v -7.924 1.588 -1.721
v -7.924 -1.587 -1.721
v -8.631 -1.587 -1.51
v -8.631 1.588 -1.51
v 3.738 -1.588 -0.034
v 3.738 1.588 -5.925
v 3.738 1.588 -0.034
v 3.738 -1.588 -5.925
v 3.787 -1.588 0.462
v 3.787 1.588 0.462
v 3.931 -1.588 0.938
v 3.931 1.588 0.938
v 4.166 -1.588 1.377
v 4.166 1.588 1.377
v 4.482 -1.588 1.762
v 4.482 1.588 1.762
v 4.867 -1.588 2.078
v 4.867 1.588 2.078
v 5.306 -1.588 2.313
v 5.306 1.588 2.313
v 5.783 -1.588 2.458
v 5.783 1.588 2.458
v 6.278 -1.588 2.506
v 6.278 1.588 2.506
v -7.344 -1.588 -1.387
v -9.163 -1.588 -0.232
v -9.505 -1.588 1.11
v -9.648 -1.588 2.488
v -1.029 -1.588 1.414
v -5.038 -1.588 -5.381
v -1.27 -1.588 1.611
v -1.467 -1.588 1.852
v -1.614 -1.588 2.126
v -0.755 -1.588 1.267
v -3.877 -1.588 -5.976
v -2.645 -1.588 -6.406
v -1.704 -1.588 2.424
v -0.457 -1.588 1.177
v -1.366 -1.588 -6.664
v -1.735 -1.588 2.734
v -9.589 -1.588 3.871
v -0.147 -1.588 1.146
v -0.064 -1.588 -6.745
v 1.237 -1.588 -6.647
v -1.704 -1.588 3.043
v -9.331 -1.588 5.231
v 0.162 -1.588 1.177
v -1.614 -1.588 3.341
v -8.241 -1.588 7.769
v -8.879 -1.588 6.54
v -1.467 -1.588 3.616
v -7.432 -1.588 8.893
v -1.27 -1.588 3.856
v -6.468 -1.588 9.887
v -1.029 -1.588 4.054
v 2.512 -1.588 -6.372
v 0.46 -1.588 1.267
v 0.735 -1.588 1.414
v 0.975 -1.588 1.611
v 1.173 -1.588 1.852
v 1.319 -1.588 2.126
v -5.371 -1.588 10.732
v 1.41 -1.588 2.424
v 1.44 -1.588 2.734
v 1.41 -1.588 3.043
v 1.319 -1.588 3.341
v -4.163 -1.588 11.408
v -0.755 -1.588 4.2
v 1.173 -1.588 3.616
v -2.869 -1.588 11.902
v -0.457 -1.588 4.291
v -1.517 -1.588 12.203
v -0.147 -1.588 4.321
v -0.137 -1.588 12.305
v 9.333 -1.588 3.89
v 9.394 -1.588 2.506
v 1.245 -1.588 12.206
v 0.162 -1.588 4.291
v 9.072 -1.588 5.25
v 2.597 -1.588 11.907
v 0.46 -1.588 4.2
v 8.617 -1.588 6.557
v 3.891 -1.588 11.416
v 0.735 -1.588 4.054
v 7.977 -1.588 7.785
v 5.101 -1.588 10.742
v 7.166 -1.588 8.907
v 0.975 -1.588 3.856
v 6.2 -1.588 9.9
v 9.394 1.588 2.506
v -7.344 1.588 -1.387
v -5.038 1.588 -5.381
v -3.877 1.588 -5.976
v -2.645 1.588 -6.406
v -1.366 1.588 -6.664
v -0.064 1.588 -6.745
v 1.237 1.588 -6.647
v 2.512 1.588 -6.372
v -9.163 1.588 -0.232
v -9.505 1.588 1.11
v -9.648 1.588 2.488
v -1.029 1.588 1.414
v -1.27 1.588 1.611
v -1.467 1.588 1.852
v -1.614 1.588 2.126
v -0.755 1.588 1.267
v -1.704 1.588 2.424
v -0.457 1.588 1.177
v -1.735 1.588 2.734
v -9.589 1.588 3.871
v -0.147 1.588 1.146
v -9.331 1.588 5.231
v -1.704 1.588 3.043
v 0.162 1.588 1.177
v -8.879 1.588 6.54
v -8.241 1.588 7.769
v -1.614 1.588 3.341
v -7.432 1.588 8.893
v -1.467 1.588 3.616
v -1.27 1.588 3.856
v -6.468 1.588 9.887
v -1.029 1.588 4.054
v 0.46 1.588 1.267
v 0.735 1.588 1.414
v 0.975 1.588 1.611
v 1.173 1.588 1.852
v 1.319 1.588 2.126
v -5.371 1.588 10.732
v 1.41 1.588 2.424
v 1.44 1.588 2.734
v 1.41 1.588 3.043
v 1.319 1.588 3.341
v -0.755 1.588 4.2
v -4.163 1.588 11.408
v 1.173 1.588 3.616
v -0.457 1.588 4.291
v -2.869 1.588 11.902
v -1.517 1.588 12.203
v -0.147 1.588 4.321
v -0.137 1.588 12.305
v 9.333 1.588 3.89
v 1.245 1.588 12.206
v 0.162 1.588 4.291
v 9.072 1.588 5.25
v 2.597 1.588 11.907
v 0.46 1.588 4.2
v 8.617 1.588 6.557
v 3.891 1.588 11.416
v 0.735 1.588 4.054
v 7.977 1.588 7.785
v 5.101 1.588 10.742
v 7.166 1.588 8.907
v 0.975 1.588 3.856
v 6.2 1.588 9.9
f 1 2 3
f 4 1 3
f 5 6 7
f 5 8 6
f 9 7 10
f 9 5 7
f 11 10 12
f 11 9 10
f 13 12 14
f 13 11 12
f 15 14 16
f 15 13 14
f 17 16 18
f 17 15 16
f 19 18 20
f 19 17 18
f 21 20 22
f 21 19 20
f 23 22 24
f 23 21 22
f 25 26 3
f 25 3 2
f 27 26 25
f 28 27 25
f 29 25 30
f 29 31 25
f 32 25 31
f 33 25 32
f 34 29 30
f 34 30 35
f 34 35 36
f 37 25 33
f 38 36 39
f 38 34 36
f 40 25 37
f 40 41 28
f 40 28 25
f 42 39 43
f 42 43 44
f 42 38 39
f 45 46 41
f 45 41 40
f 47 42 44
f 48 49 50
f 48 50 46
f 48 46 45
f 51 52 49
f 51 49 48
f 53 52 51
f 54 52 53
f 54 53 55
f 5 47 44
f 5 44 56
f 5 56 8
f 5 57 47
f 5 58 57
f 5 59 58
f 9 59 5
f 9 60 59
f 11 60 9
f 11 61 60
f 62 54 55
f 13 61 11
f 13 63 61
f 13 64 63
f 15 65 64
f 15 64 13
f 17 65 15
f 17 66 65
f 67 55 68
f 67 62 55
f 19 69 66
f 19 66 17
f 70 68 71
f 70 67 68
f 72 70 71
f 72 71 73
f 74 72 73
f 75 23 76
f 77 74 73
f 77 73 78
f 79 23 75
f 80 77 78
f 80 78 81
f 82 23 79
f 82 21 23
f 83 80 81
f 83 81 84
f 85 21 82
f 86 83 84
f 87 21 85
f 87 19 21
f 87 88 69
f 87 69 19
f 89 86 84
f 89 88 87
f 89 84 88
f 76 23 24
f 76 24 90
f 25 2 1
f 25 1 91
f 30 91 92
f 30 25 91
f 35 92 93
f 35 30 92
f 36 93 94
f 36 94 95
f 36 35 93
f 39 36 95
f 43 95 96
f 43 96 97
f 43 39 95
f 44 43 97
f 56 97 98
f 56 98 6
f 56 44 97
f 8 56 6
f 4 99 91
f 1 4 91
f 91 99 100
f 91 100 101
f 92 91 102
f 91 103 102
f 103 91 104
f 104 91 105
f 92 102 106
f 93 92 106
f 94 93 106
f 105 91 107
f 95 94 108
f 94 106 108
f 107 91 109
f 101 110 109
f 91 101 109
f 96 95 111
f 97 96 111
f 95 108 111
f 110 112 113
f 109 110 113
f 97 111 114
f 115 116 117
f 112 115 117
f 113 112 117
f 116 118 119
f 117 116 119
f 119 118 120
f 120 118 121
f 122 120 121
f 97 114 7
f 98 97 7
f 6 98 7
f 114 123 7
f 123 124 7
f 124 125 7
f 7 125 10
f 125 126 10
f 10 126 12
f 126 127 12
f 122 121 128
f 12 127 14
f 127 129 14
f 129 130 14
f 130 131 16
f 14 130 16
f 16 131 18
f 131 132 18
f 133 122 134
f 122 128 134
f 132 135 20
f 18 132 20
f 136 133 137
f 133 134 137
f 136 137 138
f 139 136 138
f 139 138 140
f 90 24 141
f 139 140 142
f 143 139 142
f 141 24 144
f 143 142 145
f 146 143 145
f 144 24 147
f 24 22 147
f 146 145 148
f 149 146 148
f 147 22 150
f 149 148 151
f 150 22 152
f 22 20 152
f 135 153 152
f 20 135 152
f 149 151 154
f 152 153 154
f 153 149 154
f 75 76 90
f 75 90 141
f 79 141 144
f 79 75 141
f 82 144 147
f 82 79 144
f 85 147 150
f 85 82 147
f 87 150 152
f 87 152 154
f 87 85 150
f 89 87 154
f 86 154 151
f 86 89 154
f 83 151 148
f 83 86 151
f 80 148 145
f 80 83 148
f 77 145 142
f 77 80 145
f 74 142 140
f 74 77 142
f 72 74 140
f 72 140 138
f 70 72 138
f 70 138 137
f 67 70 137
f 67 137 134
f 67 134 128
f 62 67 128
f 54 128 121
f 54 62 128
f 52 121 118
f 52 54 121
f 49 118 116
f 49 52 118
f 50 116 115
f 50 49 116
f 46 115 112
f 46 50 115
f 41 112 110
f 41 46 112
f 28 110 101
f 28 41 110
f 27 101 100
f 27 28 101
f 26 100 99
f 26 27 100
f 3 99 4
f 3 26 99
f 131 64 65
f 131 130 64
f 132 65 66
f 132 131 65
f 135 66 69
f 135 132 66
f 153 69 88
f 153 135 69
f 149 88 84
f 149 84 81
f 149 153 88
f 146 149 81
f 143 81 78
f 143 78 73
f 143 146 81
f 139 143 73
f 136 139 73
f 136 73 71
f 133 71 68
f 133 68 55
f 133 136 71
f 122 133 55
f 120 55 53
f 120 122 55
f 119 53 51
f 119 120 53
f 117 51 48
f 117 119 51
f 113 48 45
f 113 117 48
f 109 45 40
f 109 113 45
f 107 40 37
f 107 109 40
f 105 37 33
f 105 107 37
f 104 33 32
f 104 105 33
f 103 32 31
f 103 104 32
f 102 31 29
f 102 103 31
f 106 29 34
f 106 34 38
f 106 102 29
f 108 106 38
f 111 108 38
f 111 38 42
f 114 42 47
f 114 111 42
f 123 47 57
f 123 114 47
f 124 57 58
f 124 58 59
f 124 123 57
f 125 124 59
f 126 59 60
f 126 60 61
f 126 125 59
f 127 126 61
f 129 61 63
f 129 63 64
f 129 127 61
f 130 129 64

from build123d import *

# Parameters (mm, degrees)
F0_R        = 1.5875
F1_DEPTH    = 1.5875
F2_T1_DEPTH = 5.9319428422


# Not quite as in the source:
# - a fillet or chamfer that OpenCascade refuses, or shapes differently, is made with other operations: its cross-section is extruded or revolved along the edge and cut away or added


with BuildPart() as f1:
    # F0 (on Front) → F1 (new body, symmetric)
    with BuildSketch(Plane.XZ):
        with BuildLine():
            ThreePointArc((3.7381009291, -0.0336915449), (4.4820497049, 1.7623596793), (6.2781009291, 2.5063084551))
            Line((6.2781009291, 2.5063084551), (9.3939231872, 2.5063084551))
            ThreePointArc((9.3939231872, 2.5063084551), (-2.459861222, 12.0150971251), (-8.3760311943, -1.9823383417))
            Line((-8.3760311943, -1.9823383417), (-7.3443697718, -1.3867083417))
            Line((-7.3443697718, -1.3867083417), (-5.0381606197, -5.381179766))
            ThreePointArc((-5.0381606197, -5.381179766), (-0.7165786385, -6.7265825886), (3.7381009291, -5.9253276194))
            Line((3.7381009291, -5.9253276194), (3.7381009291, -0.0336915449))
        make_face()
        with Locations((-0.1472348195, 2.7336615811)):
            Circle(F0_R, mode=Mode.SUBTRACT)
    extrude(amount=F1_DEPTH, both=True)

    # F2: chamfer of 0.508 on 1 edges, made by hand

    # F2_s2 → F2_t1 (cut)
    with BuildSketch(Plane.XZ.offset(-2.9659714211)):
        with BuildLine():
            Line((-7.9236877385, -1.7211777257), (-8.6312397675, -1.5100480025))
            ThreePointArc((-8.6312397675, -1.5100480025), (-8.5103751964, -1.7416719985), (-8.3760311943, -1.9823383417))
            Line((-8.3760311943, -1.9823383417), (-7.9236877385, -1.7211777257))
        make_face()
    extrude(amount=F2_T1_DEPTH, mode=Mode.SUBTRACT)


solid = f1.part
